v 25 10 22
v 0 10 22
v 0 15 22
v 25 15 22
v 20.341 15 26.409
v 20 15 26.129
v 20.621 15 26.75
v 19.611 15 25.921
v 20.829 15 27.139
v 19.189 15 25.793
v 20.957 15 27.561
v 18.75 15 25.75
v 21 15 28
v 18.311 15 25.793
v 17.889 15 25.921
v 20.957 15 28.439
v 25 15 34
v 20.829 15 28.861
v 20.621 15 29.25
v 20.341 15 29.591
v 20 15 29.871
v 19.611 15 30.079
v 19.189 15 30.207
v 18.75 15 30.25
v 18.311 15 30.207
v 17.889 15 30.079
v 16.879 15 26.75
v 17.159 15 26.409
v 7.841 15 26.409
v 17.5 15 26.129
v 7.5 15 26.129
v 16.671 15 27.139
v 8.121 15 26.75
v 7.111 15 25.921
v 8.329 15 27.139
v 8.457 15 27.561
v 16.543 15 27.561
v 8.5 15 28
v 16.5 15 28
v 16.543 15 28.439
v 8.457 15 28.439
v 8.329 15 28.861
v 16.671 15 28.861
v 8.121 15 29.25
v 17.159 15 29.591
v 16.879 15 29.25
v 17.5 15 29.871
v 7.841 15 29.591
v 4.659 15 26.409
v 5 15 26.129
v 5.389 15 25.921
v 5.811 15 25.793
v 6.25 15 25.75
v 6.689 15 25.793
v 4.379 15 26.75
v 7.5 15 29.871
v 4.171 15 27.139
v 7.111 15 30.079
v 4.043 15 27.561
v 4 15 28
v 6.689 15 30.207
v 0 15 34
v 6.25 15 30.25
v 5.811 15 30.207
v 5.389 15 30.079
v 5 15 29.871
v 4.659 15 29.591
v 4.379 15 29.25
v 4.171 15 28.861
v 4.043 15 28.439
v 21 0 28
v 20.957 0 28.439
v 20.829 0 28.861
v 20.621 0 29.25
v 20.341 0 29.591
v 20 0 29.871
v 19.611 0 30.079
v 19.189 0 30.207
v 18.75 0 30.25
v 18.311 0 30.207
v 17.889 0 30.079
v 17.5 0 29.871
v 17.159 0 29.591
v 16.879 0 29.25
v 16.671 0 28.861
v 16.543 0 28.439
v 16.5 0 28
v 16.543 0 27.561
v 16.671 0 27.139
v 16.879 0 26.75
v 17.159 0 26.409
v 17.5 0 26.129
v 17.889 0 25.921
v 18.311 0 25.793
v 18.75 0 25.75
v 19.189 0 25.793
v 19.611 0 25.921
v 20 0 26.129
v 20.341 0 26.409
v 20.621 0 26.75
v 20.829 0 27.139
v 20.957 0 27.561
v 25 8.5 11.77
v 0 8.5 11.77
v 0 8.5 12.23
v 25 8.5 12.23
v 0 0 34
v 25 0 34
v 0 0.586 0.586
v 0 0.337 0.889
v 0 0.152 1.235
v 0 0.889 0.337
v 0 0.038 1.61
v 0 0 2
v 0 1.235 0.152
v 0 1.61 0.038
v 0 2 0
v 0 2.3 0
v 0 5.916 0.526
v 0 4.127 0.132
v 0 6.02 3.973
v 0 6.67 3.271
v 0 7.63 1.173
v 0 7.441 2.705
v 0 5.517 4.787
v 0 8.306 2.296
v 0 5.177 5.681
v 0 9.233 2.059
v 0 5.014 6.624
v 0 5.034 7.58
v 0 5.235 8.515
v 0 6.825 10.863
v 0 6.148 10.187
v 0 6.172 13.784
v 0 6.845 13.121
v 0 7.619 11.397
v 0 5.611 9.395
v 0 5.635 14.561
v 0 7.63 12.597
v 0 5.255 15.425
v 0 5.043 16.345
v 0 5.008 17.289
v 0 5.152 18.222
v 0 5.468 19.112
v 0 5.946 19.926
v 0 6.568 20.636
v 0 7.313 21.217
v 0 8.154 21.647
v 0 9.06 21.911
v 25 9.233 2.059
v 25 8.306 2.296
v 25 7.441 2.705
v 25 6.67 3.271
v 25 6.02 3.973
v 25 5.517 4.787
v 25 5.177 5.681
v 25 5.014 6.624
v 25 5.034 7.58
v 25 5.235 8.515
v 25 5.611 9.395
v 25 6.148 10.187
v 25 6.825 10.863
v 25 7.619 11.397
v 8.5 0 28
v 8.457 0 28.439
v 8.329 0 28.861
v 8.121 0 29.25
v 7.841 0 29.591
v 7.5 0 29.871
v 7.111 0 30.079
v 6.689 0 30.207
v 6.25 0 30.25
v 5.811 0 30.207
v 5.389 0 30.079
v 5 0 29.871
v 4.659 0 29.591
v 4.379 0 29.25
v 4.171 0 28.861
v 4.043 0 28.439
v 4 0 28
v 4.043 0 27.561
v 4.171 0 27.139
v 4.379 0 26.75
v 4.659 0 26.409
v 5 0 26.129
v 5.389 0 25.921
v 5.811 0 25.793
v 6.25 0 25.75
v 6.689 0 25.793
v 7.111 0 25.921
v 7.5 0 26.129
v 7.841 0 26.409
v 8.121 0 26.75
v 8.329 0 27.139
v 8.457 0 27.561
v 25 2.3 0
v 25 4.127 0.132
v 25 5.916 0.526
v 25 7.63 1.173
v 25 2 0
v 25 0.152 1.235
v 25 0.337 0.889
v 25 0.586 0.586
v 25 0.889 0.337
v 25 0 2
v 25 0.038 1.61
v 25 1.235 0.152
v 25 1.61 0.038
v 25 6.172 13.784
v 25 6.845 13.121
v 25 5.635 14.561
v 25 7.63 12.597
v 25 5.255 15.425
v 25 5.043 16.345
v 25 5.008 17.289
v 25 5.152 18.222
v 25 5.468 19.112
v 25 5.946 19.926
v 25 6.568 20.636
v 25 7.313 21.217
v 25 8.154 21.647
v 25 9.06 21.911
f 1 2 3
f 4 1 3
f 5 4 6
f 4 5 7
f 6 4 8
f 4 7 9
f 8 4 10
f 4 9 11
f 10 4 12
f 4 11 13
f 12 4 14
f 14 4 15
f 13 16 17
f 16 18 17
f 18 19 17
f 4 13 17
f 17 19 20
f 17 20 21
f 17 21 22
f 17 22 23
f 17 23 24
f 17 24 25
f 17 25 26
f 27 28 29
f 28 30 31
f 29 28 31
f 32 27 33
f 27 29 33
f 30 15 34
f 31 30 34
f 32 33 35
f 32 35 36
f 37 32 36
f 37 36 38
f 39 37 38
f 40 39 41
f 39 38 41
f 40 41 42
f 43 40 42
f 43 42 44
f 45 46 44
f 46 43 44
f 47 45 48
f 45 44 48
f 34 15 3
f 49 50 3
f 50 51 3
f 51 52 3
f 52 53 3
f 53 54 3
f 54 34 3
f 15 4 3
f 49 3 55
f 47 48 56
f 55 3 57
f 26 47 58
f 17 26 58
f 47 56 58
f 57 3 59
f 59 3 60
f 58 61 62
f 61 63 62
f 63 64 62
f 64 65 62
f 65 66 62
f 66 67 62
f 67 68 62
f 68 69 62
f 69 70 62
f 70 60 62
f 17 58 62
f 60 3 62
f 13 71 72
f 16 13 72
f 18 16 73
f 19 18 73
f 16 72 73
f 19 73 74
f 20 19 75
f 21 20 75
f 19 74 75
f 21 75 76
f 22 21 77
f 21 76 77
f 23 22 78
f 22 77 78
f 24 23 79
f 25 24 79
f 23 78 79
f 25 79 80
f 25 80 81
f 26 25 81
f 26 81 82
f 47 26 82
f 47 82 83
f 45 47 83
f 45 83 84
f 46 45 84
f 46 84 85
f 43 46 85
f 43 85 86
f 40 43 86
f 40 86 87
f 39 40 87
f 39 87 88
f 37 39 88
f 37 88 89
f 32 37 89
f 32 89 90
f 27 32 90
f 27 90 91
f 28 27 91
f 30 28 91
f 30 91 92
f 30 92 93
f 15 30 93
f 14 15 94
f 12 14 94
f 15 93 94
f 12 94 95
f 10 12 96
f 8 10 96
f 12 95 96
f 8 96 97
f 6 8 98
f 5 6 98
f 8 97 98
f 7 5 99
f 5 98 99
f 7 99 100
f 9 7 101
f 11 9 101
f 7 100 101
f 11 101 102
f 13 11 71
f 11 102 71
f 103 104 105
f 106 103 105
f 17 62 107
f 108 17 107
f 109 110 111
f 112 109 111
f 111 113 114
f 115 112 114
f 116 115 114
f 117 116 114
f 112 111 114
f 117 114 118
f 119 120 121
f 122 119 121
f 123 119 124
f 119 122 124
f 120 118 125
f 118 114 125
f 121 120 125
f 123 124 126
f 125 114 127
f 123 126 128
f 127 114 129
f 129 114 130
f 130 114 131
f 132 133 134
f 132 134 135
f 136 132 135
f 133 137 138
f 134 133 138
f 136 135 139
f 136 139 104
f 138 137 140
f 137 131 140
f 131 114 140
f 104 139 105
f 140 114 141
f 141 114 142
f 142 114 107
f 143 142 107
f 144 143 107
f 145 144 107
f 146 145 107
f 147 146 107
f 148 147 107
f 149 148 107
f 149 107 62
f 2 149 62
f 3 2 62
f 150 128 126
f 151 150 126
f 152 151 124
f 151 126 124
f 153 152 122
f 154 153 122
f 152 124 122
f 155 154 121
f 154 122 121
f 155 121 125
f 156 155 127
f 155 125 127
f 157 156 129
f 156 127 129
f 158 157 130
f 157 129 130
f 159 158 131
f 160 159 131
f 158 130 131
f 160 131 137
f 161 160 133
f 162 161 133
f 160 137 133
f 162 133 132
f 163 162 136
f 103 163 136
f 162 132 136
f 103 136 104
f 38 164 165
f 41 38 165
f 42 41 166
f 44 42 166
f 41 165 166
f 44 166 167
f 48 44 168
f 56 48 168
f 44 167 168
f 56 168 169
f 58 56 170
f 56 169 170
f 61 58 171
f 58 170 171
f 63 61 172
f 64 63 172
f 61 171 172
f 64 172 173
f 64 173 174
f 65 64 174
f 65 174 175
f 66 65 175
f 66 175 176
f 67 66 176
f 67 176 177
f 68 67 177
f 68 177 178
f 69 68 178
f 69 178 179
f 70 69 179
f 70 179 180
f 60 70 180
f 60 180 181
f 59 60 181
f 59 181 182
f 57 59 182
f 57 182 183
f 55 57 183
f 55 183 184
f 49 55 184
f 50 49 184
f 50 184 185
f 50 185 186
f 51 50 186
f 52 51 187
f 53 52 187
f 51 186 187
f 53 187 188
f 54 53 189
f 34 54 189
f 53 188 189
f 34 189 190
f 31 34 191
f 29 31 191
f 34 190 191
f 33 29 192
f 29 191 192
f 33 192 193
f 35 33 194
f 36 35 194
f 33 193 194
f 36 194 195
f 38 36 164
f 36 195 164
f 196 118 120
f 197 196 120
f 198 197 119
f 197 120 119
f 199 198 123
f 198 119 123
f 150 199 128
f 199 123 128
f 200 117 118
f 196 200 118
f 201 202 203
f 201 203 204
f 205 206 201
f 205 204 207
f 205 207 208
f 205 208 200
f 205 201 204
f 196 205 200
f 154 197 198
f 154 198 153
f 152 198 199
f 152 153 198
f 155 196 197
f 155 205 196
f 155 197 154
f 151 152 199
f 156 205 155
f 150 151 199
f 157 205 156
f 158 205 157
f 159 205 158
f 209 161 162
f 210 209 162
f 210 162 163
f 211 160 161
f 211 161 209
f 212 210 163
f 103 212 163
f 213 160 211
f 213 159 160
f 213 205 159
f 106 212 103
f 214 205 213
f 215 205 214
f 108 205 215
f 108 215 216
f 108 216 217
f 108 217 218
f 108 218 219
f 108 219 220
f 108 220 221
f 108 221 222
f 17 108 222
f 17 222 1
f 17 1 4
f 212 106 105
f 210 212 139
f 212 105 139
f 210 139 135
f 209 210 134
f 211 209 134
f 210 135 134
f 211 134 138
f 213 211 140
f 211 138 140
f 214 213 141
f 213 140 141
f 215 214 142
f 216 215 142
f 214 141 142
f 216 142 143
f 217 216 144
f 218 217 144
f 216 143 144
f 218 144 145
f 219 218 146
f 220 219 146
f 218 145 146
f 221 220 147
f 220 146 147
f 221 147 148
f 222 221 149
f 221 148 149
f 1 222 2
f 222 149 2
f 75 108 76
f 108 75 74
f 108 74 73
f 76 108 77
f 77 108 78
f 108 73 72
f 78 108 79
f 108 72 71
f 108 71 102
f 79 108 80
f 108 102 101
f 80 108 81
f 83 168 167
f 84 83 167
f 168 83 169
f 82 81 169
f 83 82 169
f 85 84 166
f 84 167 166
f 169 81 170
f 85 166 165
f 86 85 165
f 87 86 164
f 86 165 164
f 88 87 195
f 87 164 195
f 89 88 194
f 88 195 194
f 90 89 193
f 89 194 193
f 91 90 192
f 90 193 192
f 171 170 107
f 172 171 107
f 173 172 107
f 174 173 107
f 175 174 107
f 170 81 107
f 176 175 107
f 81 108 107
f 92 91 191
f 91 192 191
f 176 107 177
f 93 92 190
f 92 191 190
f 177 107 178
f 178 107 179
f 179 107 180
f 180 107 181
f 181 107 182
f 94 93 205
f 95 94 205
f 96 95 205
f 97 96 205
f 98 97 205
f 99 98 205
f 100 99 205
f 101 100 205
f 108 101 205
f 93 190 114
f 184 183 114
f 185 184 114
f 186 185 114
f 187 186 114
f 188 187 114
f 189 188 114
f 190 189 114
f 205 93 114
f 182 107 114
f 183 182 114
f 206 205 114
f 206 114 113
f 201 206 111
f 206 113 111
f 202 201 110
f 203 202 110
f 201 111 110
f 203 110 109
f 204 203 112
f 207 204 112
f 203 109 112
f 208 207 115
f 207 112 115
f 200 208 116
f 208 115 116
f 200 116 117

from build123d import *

# Parameters (mm, degrees)
F1_DEPTH = 25
F2_R     = 2.25
F3_DEPTH = 28.7
F4_R     = 4.25
F4_R_2   = 2.25
F4_W     = 25
F4_H     = 32
F5_DEPTH = 2


with BuildPart() as f1:
    # F0 (on Right) → F1 (new body)
    with BuildSketch(Plane.YZ):
        with BuildLine():
            ThreePointArc((0, 2), (0.585786, 0.585786), (2, 0))
            Line((2, 0), (2.3, 0))
            ThreePointArc((2.3, 0), (5.916074, 0.525682), (9.232793, 2.059211))
            ThreePointArc((9.232793, 2.059211), (5.014177, 6.623749), (8.5, 11.769696))
            Line((8.5, 11.769696), (8.5, 12.230304))
            ThreePointArc((8.5, 12.230304), (5.057911, 17.758788), (10, 22))
            Line((10, 22), (15, 22))
            Line((15, 22), (15, 34))
            Line((15, 34), (0, 34))
            Line((0, 34), (0, 2))
        make_face()
    extrude(amount=F1_DEPTH)

    # F2 (on face) → F3 (cut)
    with BuildSketch(Plane.XZ):
        with Locations((6.25, 28)):
            Circle(F2_R)
        with Locations((18.75, 28)):
            Circle(F2_R)
    extrude(amount=-F3_DEPTH, mode=Mode.SUBTRACT)

    # F4 (on face) → F5 (join)
    with BuildSketch(Plane.XZ):
        with Locations((6.25, 28)):
            Circle(F4_R)
        with Locations((6.25, 28)):
            Circle(F4_R_2, mode=Mode.SUBTRACT)
        with Locations((12.5, 18)):
            Rectangle(F4_W, F4_H)
        with Locations((6.25, 28)):
            Circle(F4_R, mode=Mode.SUBTRACT)
        with Locations((18.75, 28)):
            Circle(F4_R, mode=Mode.SUBTRACT)
    extrude(amount=-F5_DEPTH)


solid = f1.part
